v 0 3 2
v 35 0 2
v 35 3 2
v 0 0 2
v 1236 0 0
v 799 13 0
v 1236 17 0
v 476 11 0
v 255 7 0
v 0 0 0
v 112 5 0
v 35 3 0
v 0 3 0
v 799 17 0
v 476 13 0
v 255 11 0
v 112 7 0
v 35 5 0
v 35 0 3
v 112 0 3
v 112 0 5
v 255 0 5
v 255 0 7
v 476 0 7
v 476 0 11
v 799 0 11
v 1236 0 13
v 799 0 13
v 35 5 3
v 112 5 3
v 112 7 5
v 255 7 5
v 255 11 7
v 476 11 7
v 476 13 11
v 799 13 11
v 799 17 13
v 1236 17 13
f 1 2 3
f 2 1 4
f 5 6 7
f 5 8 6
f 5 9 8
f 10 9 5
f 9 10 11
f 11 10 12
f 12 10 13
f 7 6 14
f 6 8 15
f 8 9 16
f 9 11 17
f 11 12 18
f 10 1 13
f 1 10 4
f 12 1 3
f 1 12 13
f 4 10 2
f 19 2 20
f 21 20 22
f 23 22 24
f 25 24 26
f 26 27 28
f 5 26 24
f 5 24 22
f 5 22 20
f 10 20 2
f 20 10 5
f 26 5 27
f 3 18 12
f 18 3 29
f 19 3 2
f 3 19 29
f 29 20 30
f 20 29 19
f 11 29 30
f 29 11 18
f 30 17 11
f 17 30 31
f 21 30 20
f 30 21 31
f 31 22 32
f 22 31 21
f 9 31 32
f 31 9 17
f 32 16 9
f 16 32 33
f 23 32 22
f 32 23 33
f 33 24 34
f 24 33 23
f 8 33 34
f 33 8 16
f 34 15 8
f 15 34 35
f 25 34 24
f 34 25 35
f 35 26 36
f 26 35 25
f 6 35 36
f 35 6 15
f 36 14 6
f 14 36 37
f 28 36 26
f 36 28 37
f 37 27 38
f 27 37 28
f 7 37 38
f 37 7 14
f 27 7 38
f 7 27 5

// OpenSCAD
translate([2.5, 1.5, 1.0]) color([0.10728537706325991, 0.8996256313138141, 0.6100819970747507]) cube([5, 3, 2], center=true);
translate([7.5, 1.5, 1.0]) color([0.7890377134172993, 0.7110679469752405, 0.7774643558396669]) cube([5, 3, 2], center=true);
translate([12.5, 1.5, 1.0]) color([0.5140354678382717, 0.46207744282607, 0.6343562920465169]) cube([5, 3, 2], center=true);
translate([17.5, 1.5, 1.0]) color([0.27254621857246664, 0.016558424522952975, 0.6148716567717017]) cube([5, 3, 2], center=true);
translate([22.5, 1.5, 1.0]) color([0.7119066573597548, 0.17257617960039529, 0.41465974039415787]) cube([5, 3, 2], center=true);
translate([27.5, 1.5, 1.0]) color([0.21806470516739018, 0.8797884787327306, 0.9971497033508181]) cube([5, 3, 2], center=true);
translate([32.5, 1.5, 1.0]) color([0.006439244314443648, 0.5355241113549698, 0.428269623660265]) cube([5, 3, 2], center=true);
translate([38.5, 2.5, 1.5]) color([0.0497703561320445, 0.3846945959716809, 0.27248481749180187]) cube([7, 5, 3], center=true);
translate([45.5, 2.5, 1.5]) color([0.9711494351721061, 0.5646669518865992, 0.22956269737245216]) cube([7, 5, 3], center=true);
translate([52.5, 2.5, 1.5]) color([0.7165492601952248, 0.5466375027642284, 0.2821670936164109]) cube([7, 5, 3], center=true);
translate([59.5, 2.5, 1.5]) color([0.7398695784196249, 0.9015687423954613, 0.06478718309218656]) cube([7, 5, 3], center=true);
translate([66.5, 2.5, 1.5]) color([0.3075184499818515, 0.32730937178137276, 0.373196919474838]) cube([7, 5, 3], center=true);
translate([73.5, 2.5, 1.5]) color([0.48026967262350795, 0.5820603979481933, 0.1372879505883815]) cube([7, 5, 3], center=true);
translate([80.5, 2.5, 1.5]) color([0.015498761483451418, 0.5048497045627587, 0.36698725510709684]) cube([7, 5, 3], center=true);
translate([87.5, 2.5, 1.5]) color([0.6348155217266559, 0.811995686067811, 0.8768405645756486]) cube([7, 5, 3], center=true);
translate([94.5, 2.5, 1.5]) color([0.1552431358080847, 0.1767648869043179, 0.991228648099722]) cube([7, 5, 3], center=true);
translate([101.5, 2.5, 1.5]) color([0.13558077637136434, 0.20650423900368708, 0.9151210693627757]) cube([7, 5, 3], center=true);
translate([108.5, 2.5, 1.5]) color([0.49673738754911745, 0.7672539256192649, 0.969306850533619]) cube([7, 5, 3], center=true);
translate([117.5, 3.5, 2.5]) color([0.23531586477578126, 0.13212860983739783, 0.23368957459901674]) cube([11, 7, 5], center=true);
translate([128.5, 3.5, 2.5]) color([0.38460662479298113, 0.6084990843462054, 0.1325407149567407]) cube([11, 7, 5], center=true);
translate([139.5, 3.5, 2.5]) color([0.4984659545183915, 0.9178662904203972, 0.6160167741323543]) cube([11, 7, 5], center=true);
translate([150.5, 3.5, 2.5]) color([0.02601445858505036, 0.596125612844632, 0.48919913512172475]) cube([11, 7, 5], center=true);
translate([161.5, 3.5, 2.5]) color([0.30869925031539414, 0.9586301909392594, 0.5555224541780607]) cube([11, 7, 5], center=true);
translate([172.5, 3.5, 2.5]) color([0.16303723797834868, 0.8790785483620981, 0.8092366229990562]) cube([11, 7, 5], center=true);
translate([183.5, 3.5, 2.5]) color([0.7373715302416316, 0.5460288399006699, 0.7042240787132147]) cube([11, 7, 5], center=true);
translate([194.5, 3.5, 2.5]) color([0.07877233817546292, 0.13744427713979768, 0.40185422229333856]) cube([11, 7, 5], center=true);
translate([205.5, 3.5, 2.5]) color([0.1910666288561843, 0.31642065037316636, 0.2917281417853558]) cube([11, 7, 5], center=true);
translate([216.5, 3.5, 2.5]) color([0.9437754009602987, 0.20866341172373193, 0.3151573145870893]) cube([11, 7, 5], center=true);
translate([227.5, 3.5, 2.5]) color([0.7470721078045024, 0.24960896628473228, 0.8629627260654799]) cube([11, 7, 5], center=true);
translate([238.5, 3.5, 2.5]) color([0.6684326881602258, 0.6597695027130189, 0.22591717735012307]) cube([11, 7, 5], center=true);
translate([249.5, 3.5, 2.5]) color([0.3441717078654829, 0.16233220178561225, 0.01697652307419406]) cube([11, 7, 5], center=true);
translate([261.5, 5.5, 3.5]) color([0.5735931064152219, 0.05818297514553228, 0.6304378073753134]) cube([13, 11, 7], center=true);
translate([274.5, 5.5, 3.5]) color([0.35341956482818127, 0.49110709598533775, 0.06132304686728618]) cube([13, 11, 7], center=true);
translate([287.5, 5.5, 3.5]) color([0.24146702174069912, 0.012441234482642782, 0.9455344576677447]) cube([13, 11, 7], center=true);
translate([300.5, 5.5, 3.5]) color([0.3266678829978785, 0.820956849026723, 0.34492851027915805]) cube([13, 11, 7], center=true);
translate([313.5, 5.5, 3.5]) color([0.6639756368298299, 0.13585073420724958, 0.9219835342207869]) cube([13, 11, 7], center=true);
translate([326.5, 5.5, 3.5]) color([0.44896684911260887, 0.1420549627992148, 0.3119518323014343]) cube([13, 11, 7], center=true);
translate([339.5, 5.5, 3.5]) color([0.6490756968320398, 0.7280642389267371, 0.7852833252199665]) cube([13, 11, 7], center=true);
translate([352.5, 5.5, 3.5]) color([0.40863068686923587, 0.009633238682779877, 0.8909238596539266]) cube([13, 11, 7], center=true);
translate([365.5, 5.5, 3.5]) color([0.533705581213062, 0.8046005274030336, 0.9806276909012095]) cube([13, 11, 7], center=true);
translate([378.5, 5.5, 3.5]) color([0.7049346898693578, 0.7590860206033218, 0.5647284680717275]) cube([13, 11, 7], center=true);
translate([391.5, 5.5, 3.5]) color([0.12259546226958773, 0.9539533584587191, 0.1713156178825357]) cube([13, 11, 7], center=true);
translate([404.5, 5.5, 3.5]) color([0.5005542720722199, 0.621843985236089, 0.6619765424276485]) cube([13, 11, 7], center=true);
translate([417.5, 5.5, 3.5]) color([0.8400519693824264, 0.699601591737329, 0.07964741684534404]) cube([13, 11, 7], center=true);
translate([430.5, 5.5, 3.5]) color([0.23738047361475634, 0.8282556520451495, 0.1762738246231843]) cube([13, 11, 7], center=true);
translate([443.5, 5.5, 3.5]) color([0.9459581227747745, 0.9565644324307663, 0.8963269305888116]) cube([13, 11, 7], center=true);
translate([456.5, 5.5, 3.5]) color([0.7428117304122551, 0.8383436924491765, 0.5614087817692366]) cube([13, 11, 7], center=true);
translate([469.5, 5.5, 3.5]) color([0.7177928021437573, 0.4271772721979724, 0.8646648421725511]) cube([13, 11, 7], center=true);
translate([484.5, 6.5, 5.5]) color([0.10365846470378459, 0.6285317276232824, 0.7101075213407797]) cube([17, 13, 11], center=true);
translate([501.5, 6.5, 5.5]) color([0.6149371087697887, 0.0400488022899097, 0.34025031183581533]) cube([17, 13, 11], center=true);
translate([518.5, 6.5, 5.5]) color([0.7380159626358669, 0.3765176313166855, 0.6257641682954356]) cube([17, 13, 11], center=true);
translate([535.5, 6.5, 5.5]) color([0.8894786539399329, 0.4963449395419606, 0.3583651728386771]) cube([17, 13, 11], center=true);
translate([552.5, 6.5, 5.5]) color([0.6716454412848432, 0.45811681625355094, 0.5074379917667022]) cube([17, 13, 11], center=true);
translate([569.5, 6.5, 5.5]) color([0.16228475224599026, 0.7529781863444399, 0.3376457636791449]) cube([17, 13, 11], center=true);
translate([586.5, 6.5, 5.5]) color([0.8033239356600728, 0.9444207727357242, 0.014783921172948133]) cube([17, 13, 11], center=true);
translate([603.5, 6.5, 5.5]) color([0.5303420268039528, 0.2882277186993394, 0.4689175335863792]) cube([17, 13, 11], center=true);
translate([620.5, 6.5, 5.5]) color([0.03492832759702502, 0.5317931441254861, 0.552095437515129]) cube([17, 13, 11], center=true);
translate([637.5, 6.5, 5.5]) color([0.9340898594770107, 0.03830085289416996, 0.3950652682884612]) cube([17, 13, 11], center=true);
translate([654.5, 6.5, 5.5]) color([0.1200155720396251, 0.34658884626630715, 0.051152415727703016]) cube([17, 13, 11], center=true);
translate([671.5, 6.5, 5.5]) color([0.2730496953424699, 0.9956802504828091, 0.25391998649183944]) cube([17, 13, 11], center=true);
translate([688.5, 6.5, 5.5]) color([0.6803935586065328, 0.7027090324157298, 0.9291230685247301]) cube([17, 13, 11], center=true);
translate([705.5, 6.5, 5.5]) color([0.9949404722907454, 0.7620813713006523, 0.7625973189567923]) cube([17, 13, 11], center=true);
translate([722.5, 6.5, 5.5]) color([0.5162610213479427, 0.3860717563215982, 0.8343975914408754]) cube([17, 13, 11], center=true);
translate([739.5, 6.5, 5.5]) color([0.2506337702942619, 0.11599539642064438, 0.9817240858781537]) cube([17, 13, 11], center=true);
translate([756.5, 6.5, 5.5]) color([0.8047994372884794, 0.9431012043694105, 0.24264659424234813]) cube([17, 13, 11], center=true);
translate([773.5, 6.5, 5.5]) color([0.6738638931519124, 0.5327800265053269, 0.8756440829735669]) cube([17, 13, 11], center=true);
translate([790.5, 6.5, 5.5]) color([0.16255101499230828, 0.8680483691353614, 0.15305579700066485]) cube([17, 13, 11], center=true);
translate([808.5, 8.5, 6.5]) color([0.8462165202751376, 0.8200801239095041, 0.5849326984313064]) cube([19, 17, 13], center=true);
translate([827.5, 8.5, 6.5]) color([0.05125489506773162, 0.156166769208809, 0.34458118202681143]) cube([19, 17, 13], center=true);
translate([846.5, 8.5, 6.5]) color([0.291190613997825, 0.29342424365134856, 0.49485912757206985]) cube([19, 17, 13], center=true);
translate([865.5, 8.5, 6.5]) color([0.40365829021262367, 0.43100562682353716, 0.17003546655932655]) cube([19, 17, 13], center=true);
translate([884.5, 8.5, 6.5]) color([0.788340085303476, 0.5686027559906347, 0.44188886974638586]) cube([19, 17, 13], center=true);
translate([903.5, 8.5, 6.5]) color([0.3413461590512491, 0.009317740415098474, 0.72162474304745]) cube([19, 17, 13], center=true);
translate([922.5, 8.5, 6.5]) color([0.9099060293040379, 0.6642090292154819, 0.6628365798191557]) cube([19, 17, 13], center=true);
translate([941.5, 8.5, 6.5]) color([0.2575988974219705, 0.6122127561841502, 0.07024606726227145]) cube([19, 17, 13], center=true);
translate([960.5, 8.5, 6.5]) color([0.936077955543095, 0.27870721332570936, 0.8301443917589898]) cube([19, 17, 13], center=true);
translate([979.5, 8.5, 6.5]) color([0.5295296249528143, 0.06328696503387199, 0.639390097241117]) cube([19, 17, 13], center=true);
translate([998.5, 8.5, 6.5]) color([0.579686955437464, 0.9416538141960143, 0.6321291610349786]) cube([19, 17, 13], center=true);
translate([1017.5, 8.5, 6.5]) color([0.5434228748459046, 0.38469874676133664, 0.434637548519362]) cube([19, 17, 13], center=true);
translate([1036.5, 8.5, 6.5]) color([0.31139777068021024, 0.01363511702942577, 0.7785312160167684]) cube([19, 17, 13], center=true);
translate([1055.5, 8.5, 6.5]) color([0.8197509625398982, 0.28044077713976767, 0.2581907625337724]) cube([19, 17, 13], center=true);
translate([1074.5, 8.5, 6.5]) color([0.5272652548146236, 0.3179301097250754, 0.3422638341038545]) cube([19, 17, 13], center=true);
translate([1093.5, 8.5, 6.5]) color([0.7055726929201963, 0.43169639849300545, 0.14170724037842175]) cube([19, 17, 13], center=true);
translate([1112.5, 8.5, 6.5]) color([0.0059275683019511805, 0.5113413643489257, 0.7846494738841625]) cube([19, 17, 13], center=true);
translate([1131.5, 8.5, 6.5]) color([0.7013909140505133, 0.7815279332048084, 0.38414456219182536]) cube([19, 17, 13], center=true);
translate([1150.5, 8.5, 6.5]) color([0.4641305725985776, 0.036369164001931575, 0.9124290899309246]) cube([19, 17, 13], center=true);
translate([1169.5, 8.5, 6.5]) color([0.6366653413633517, 0.798477007479407, 0.7602358551941967]) cube([19, 17, 13], center=true);
translate([1188.5, 8.5, 6.5]) color([0.899814300356001, 0.3622224295816935, 0.9815510059994267]) cube([19, 17, 13], center=true);
translate([1207.5, 8.5, 6.5]) color([0.15851660579635174, 0.19450942151924966, 0.35447317829590397]) cube([19, 17, 13], center=true);
translate([1226.5, 8.5, 6.5]) color([0.700089123077614, 0.019141470871264166, 0.7352582011311831]) cube([19, 17, 13], center=true);
